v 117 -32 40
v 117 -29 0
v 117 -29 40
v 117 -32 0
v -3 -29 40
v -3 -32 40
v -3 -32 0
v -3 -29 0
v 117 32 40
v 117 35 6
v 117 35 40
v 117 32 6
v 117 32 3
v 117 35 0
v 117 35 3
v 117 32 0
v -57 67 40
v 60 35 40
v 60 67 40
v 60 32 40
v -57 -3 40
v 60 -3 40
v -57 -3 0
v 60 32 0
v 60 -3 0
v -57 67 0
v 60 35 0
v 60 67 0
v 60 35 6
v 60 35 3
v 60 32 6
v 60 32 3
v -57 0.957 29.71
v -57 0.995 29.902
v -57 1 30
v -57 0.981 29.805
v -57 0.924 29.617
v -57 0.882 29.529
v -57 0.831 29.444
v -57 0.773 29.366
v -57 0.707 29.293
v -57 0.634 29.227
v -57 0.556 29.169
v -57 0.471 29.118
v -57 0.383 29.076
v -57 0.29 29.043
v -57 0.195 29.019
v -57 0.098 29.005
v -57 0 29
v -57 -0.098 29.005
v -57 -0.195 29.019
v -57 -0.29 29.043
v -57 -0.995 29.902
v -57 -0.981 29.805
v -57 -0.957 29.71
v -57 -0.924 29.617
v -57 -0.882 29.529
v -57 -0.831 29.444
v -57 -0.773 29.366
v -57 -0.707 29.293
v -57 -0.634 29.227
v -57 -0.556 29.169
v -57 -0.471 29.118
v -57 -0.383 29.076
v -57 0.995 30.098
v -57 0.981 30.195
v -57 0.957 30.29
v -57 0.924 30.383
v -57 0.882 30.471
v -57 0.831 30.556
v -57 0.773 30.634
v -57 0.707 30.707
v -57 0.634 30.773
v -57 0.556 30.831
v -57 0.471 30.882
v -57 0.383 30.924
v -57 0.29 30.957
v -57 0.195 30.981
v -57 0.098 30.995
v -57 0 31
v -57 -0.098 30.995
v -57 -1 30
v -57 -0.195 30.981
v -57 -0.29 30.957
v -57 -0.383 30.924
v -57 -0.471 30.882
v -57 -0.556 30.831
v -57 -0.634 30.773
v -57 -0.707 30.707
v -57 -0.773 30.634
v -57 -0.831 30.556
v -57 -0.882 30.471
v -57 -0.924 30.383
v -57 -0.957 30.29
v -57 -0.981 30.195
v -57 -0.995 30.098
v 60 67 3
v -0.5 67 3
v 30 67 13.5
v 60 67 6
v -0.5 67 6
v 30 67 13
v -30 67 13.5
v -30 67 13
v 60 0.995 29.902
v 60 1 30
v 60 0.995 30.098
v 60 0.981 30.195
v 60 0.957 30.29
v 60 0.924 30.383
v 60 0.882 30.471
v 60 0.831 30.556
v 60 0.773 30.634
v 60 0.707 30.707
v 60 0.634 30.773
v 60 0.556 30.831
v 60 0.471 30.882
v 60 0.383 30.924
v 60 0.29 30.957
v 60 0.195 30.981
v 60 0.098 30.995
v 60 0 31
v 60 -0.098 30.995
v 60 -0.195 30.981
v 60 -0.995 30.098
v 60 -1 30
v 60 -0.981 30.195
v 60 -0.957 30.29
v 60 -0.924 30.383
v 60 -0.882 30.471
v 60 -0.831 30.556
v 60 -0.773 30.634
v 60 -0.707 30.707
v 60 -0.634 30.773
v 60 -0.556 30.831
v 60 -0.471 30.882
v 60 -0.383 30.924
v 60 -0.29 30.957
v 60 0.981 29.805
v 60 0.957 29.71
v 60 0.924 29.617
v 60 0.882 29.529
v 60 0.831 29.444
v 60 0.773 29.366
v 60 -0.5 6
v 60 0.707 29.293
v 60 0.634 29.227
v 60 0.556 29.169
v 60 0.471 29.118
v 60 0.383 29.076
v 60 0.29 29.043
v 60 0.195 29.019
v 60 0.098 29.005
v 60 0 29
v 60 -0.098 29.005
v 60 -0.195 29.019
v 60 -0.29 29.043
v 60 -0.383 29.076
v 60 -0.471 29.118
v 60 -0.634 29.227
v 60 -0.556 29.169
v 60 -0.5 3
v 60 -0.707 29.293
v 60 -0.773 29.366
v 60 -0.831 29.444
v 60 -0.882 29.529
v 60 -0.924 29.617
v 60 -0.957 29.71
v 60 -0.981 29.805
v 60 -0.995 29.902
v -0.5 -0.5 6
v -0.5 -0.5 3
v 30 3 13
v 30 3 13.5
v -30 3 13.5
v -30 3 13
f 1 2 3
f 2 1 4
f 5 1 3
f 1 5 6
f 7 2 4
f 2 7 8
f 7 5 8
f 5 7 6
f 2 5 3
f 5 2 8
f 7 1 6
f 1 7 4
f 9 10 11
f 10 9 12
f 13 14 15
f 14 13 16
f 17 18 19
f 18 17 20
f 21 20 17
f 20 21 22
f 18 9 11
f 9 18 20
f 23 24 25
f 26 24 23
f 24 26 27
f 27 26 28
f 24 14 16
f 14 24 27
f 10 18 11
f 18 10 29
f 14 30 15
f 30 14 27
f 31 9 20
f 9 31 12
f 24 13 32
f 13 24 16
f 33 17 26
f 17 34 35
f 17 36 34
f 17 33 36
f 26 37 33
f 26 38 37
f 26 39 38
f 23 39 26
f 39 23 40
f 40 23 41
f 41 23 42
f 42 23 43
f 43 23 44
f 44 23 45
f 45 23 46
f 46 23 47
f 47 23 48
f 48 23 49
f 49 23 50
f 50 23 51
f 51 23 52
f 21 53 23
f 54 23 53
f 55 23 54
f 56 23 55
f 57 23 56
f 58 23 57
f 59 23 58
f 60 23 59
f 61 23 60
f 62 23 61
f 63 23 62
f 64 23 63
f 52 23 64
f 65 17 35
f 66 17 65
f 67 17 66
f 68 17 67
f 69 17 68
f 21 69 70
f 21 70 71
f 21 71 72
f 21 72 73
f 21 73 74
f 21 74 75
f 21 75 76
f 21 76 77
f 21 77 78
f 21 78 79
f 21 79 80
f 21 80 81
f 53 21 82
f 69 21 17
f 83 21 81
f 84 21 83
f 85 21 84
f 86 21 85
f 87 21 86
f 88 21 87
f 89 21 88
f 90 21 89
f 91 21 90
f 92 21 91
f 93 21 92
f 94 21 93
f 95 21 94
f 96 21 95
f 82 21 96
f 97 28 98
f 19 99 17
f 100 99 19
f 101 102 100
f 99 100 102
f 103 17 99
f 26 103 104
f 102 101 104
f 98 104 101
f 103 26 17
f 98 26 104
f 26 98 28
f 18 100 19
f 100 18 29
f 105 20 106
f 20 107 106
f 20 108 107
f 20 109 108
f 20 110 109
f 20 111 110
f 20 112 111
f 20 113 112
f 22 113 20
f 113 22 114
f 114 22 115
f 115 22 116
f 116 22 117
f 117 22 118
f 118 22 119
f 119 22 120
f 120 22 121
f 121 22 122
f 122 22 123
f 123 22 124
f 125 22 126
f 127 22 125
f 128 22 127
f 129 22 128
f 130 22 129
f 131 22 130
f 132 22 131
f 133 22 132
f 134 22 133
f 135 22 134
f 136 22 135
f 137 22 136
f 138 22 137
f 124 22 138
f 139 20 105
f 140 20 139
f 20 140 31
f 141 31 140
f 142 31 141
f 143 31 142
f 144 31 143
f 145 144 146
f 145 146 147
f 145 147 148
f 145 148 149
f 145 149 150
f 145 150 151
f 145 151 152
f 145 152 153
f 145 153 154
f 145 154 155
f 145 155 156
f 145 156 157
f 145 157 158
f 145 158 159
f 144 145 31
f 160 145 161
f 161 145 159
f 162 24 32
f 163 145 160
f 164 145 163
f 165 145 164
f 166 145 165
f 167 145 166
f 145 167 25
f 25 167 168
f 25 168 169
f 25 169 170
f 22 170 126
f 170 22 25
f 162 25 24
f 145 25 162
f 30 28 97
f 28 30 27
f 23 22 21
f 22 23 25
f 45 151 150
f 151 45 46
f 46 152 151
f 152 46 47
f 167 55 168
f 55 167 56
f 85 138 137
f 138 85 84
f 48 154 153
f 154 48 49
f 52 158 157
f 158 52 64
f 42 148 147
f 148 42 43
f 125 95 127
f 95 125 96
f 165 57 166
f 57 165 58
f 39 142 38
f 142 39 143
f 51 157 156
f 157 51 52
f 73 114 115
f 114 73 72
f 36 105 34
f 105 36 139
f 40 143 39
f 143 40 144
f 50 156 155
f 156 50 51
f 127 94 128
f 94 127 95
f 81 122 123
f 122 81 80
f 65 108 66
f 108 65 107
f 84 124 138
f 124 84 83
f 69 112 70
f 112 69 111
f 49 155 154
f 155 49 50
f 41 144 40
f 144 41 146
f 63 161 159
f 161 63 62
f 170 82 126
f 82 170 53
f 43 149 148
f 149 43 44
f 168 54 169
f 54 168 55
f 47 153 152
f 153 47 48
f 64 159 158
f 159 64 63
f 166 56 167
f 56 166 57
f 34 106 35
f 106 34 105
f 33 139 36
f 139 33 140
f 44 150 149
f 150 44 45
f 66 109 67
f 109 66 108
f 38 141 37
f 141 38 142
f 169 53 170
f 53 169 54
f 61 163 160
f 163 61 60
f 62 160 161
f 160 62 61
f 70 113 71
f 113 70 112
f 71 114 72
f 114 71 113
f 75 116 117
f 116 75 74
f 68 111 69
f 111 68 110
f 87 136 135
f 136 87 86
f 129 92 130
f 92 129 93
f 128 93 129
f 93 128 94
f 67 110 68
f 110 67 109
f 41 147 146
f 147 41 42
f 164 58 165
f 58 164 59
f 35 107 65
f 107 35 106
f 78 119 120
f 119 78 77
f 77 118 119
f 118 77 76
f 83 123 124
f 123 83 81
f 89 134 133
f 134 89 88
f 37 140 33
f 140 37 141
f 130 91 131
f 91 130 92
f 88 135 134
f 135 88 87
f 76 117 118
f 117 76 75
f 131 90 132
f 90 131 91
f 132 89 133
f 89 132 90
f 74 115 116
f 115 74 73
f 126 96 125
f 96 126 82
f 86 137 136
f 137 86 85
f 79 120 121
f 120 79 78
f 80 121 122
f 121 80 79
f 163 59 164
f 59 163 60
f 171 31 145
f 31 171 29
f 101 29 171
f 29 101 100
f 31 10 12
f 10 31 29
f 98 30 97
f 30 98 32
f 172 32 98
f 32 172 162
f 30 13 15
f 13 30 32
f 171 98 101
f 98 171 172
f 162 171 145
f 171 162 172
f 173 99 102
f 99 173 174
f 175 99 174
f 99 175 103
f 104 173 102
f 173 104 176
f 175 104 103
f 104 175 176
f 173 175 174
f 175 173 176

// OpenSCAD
// Mini horizontal gel-electrophoresis buffer tank
// Print orientation: base on XY plane, open top facing +Z

$fn = 64;

// --- Tank dimensions ---
tank_x = 120;   // outer length (X)
tank_y = 70;    // outer width (Y)
tank_z = 40;    // outer height (Z)

// --- Walls and floor ---
wall = 3;       // wall thickness
floor = 3;      // floor thickness

// --- Raised platform ---
plat_x = 60;    // platform length in X
plat_y = tank_y - 2*wall;  // platform spans full inner width (Y)
plat_top_z = 13;  // top of platform (10 mm above inner floor)

// --- Electrode holes ---
hole_d = 2;     // hole diameter
hole_y = 0;     // hole Y position
hole_z = 30;    // hole Z position

// --- Cutting overlap ---
eps = 0.5;      // extension past cut faces

difference() {
    // Tank body
    union() {
        // Side walls and floor
        hull() {
            for (sx = [-1, 1])
                translate([sx * (tank_x/2 - wall), -wall, 0])
                    cube([wall, tank_y, tank_z]);
        }
        // End walls
        for (sy = [-1, 1])
            translate([-wall, sy * (tank_y/2 - wall), 0])
                cube([tank_x, wall, tank_z]);
    }

    // Floor cut to expose bottom (open-bottom style)
    translate([-eps, -eps, floor])
        cube([tank_x + 2*eps, tank_y + 2*eps, floor]);

    // Raised platform
    translate([-plat_x/2, wall, wall + 10])
        cube([plat_x, plat_y, plat_top_z - wall - 10 + eps]);

    // Electrode holes through end walls
    for (x = [-plat_x/2 - 1, plat_x/2 + 1])
        translate([x, hole_y, hole_z])
            rotate([0, 90, 0])
                cylinder(d = hole_d, h = tank_y + 2*wall + 2*eps, center = true);
}
